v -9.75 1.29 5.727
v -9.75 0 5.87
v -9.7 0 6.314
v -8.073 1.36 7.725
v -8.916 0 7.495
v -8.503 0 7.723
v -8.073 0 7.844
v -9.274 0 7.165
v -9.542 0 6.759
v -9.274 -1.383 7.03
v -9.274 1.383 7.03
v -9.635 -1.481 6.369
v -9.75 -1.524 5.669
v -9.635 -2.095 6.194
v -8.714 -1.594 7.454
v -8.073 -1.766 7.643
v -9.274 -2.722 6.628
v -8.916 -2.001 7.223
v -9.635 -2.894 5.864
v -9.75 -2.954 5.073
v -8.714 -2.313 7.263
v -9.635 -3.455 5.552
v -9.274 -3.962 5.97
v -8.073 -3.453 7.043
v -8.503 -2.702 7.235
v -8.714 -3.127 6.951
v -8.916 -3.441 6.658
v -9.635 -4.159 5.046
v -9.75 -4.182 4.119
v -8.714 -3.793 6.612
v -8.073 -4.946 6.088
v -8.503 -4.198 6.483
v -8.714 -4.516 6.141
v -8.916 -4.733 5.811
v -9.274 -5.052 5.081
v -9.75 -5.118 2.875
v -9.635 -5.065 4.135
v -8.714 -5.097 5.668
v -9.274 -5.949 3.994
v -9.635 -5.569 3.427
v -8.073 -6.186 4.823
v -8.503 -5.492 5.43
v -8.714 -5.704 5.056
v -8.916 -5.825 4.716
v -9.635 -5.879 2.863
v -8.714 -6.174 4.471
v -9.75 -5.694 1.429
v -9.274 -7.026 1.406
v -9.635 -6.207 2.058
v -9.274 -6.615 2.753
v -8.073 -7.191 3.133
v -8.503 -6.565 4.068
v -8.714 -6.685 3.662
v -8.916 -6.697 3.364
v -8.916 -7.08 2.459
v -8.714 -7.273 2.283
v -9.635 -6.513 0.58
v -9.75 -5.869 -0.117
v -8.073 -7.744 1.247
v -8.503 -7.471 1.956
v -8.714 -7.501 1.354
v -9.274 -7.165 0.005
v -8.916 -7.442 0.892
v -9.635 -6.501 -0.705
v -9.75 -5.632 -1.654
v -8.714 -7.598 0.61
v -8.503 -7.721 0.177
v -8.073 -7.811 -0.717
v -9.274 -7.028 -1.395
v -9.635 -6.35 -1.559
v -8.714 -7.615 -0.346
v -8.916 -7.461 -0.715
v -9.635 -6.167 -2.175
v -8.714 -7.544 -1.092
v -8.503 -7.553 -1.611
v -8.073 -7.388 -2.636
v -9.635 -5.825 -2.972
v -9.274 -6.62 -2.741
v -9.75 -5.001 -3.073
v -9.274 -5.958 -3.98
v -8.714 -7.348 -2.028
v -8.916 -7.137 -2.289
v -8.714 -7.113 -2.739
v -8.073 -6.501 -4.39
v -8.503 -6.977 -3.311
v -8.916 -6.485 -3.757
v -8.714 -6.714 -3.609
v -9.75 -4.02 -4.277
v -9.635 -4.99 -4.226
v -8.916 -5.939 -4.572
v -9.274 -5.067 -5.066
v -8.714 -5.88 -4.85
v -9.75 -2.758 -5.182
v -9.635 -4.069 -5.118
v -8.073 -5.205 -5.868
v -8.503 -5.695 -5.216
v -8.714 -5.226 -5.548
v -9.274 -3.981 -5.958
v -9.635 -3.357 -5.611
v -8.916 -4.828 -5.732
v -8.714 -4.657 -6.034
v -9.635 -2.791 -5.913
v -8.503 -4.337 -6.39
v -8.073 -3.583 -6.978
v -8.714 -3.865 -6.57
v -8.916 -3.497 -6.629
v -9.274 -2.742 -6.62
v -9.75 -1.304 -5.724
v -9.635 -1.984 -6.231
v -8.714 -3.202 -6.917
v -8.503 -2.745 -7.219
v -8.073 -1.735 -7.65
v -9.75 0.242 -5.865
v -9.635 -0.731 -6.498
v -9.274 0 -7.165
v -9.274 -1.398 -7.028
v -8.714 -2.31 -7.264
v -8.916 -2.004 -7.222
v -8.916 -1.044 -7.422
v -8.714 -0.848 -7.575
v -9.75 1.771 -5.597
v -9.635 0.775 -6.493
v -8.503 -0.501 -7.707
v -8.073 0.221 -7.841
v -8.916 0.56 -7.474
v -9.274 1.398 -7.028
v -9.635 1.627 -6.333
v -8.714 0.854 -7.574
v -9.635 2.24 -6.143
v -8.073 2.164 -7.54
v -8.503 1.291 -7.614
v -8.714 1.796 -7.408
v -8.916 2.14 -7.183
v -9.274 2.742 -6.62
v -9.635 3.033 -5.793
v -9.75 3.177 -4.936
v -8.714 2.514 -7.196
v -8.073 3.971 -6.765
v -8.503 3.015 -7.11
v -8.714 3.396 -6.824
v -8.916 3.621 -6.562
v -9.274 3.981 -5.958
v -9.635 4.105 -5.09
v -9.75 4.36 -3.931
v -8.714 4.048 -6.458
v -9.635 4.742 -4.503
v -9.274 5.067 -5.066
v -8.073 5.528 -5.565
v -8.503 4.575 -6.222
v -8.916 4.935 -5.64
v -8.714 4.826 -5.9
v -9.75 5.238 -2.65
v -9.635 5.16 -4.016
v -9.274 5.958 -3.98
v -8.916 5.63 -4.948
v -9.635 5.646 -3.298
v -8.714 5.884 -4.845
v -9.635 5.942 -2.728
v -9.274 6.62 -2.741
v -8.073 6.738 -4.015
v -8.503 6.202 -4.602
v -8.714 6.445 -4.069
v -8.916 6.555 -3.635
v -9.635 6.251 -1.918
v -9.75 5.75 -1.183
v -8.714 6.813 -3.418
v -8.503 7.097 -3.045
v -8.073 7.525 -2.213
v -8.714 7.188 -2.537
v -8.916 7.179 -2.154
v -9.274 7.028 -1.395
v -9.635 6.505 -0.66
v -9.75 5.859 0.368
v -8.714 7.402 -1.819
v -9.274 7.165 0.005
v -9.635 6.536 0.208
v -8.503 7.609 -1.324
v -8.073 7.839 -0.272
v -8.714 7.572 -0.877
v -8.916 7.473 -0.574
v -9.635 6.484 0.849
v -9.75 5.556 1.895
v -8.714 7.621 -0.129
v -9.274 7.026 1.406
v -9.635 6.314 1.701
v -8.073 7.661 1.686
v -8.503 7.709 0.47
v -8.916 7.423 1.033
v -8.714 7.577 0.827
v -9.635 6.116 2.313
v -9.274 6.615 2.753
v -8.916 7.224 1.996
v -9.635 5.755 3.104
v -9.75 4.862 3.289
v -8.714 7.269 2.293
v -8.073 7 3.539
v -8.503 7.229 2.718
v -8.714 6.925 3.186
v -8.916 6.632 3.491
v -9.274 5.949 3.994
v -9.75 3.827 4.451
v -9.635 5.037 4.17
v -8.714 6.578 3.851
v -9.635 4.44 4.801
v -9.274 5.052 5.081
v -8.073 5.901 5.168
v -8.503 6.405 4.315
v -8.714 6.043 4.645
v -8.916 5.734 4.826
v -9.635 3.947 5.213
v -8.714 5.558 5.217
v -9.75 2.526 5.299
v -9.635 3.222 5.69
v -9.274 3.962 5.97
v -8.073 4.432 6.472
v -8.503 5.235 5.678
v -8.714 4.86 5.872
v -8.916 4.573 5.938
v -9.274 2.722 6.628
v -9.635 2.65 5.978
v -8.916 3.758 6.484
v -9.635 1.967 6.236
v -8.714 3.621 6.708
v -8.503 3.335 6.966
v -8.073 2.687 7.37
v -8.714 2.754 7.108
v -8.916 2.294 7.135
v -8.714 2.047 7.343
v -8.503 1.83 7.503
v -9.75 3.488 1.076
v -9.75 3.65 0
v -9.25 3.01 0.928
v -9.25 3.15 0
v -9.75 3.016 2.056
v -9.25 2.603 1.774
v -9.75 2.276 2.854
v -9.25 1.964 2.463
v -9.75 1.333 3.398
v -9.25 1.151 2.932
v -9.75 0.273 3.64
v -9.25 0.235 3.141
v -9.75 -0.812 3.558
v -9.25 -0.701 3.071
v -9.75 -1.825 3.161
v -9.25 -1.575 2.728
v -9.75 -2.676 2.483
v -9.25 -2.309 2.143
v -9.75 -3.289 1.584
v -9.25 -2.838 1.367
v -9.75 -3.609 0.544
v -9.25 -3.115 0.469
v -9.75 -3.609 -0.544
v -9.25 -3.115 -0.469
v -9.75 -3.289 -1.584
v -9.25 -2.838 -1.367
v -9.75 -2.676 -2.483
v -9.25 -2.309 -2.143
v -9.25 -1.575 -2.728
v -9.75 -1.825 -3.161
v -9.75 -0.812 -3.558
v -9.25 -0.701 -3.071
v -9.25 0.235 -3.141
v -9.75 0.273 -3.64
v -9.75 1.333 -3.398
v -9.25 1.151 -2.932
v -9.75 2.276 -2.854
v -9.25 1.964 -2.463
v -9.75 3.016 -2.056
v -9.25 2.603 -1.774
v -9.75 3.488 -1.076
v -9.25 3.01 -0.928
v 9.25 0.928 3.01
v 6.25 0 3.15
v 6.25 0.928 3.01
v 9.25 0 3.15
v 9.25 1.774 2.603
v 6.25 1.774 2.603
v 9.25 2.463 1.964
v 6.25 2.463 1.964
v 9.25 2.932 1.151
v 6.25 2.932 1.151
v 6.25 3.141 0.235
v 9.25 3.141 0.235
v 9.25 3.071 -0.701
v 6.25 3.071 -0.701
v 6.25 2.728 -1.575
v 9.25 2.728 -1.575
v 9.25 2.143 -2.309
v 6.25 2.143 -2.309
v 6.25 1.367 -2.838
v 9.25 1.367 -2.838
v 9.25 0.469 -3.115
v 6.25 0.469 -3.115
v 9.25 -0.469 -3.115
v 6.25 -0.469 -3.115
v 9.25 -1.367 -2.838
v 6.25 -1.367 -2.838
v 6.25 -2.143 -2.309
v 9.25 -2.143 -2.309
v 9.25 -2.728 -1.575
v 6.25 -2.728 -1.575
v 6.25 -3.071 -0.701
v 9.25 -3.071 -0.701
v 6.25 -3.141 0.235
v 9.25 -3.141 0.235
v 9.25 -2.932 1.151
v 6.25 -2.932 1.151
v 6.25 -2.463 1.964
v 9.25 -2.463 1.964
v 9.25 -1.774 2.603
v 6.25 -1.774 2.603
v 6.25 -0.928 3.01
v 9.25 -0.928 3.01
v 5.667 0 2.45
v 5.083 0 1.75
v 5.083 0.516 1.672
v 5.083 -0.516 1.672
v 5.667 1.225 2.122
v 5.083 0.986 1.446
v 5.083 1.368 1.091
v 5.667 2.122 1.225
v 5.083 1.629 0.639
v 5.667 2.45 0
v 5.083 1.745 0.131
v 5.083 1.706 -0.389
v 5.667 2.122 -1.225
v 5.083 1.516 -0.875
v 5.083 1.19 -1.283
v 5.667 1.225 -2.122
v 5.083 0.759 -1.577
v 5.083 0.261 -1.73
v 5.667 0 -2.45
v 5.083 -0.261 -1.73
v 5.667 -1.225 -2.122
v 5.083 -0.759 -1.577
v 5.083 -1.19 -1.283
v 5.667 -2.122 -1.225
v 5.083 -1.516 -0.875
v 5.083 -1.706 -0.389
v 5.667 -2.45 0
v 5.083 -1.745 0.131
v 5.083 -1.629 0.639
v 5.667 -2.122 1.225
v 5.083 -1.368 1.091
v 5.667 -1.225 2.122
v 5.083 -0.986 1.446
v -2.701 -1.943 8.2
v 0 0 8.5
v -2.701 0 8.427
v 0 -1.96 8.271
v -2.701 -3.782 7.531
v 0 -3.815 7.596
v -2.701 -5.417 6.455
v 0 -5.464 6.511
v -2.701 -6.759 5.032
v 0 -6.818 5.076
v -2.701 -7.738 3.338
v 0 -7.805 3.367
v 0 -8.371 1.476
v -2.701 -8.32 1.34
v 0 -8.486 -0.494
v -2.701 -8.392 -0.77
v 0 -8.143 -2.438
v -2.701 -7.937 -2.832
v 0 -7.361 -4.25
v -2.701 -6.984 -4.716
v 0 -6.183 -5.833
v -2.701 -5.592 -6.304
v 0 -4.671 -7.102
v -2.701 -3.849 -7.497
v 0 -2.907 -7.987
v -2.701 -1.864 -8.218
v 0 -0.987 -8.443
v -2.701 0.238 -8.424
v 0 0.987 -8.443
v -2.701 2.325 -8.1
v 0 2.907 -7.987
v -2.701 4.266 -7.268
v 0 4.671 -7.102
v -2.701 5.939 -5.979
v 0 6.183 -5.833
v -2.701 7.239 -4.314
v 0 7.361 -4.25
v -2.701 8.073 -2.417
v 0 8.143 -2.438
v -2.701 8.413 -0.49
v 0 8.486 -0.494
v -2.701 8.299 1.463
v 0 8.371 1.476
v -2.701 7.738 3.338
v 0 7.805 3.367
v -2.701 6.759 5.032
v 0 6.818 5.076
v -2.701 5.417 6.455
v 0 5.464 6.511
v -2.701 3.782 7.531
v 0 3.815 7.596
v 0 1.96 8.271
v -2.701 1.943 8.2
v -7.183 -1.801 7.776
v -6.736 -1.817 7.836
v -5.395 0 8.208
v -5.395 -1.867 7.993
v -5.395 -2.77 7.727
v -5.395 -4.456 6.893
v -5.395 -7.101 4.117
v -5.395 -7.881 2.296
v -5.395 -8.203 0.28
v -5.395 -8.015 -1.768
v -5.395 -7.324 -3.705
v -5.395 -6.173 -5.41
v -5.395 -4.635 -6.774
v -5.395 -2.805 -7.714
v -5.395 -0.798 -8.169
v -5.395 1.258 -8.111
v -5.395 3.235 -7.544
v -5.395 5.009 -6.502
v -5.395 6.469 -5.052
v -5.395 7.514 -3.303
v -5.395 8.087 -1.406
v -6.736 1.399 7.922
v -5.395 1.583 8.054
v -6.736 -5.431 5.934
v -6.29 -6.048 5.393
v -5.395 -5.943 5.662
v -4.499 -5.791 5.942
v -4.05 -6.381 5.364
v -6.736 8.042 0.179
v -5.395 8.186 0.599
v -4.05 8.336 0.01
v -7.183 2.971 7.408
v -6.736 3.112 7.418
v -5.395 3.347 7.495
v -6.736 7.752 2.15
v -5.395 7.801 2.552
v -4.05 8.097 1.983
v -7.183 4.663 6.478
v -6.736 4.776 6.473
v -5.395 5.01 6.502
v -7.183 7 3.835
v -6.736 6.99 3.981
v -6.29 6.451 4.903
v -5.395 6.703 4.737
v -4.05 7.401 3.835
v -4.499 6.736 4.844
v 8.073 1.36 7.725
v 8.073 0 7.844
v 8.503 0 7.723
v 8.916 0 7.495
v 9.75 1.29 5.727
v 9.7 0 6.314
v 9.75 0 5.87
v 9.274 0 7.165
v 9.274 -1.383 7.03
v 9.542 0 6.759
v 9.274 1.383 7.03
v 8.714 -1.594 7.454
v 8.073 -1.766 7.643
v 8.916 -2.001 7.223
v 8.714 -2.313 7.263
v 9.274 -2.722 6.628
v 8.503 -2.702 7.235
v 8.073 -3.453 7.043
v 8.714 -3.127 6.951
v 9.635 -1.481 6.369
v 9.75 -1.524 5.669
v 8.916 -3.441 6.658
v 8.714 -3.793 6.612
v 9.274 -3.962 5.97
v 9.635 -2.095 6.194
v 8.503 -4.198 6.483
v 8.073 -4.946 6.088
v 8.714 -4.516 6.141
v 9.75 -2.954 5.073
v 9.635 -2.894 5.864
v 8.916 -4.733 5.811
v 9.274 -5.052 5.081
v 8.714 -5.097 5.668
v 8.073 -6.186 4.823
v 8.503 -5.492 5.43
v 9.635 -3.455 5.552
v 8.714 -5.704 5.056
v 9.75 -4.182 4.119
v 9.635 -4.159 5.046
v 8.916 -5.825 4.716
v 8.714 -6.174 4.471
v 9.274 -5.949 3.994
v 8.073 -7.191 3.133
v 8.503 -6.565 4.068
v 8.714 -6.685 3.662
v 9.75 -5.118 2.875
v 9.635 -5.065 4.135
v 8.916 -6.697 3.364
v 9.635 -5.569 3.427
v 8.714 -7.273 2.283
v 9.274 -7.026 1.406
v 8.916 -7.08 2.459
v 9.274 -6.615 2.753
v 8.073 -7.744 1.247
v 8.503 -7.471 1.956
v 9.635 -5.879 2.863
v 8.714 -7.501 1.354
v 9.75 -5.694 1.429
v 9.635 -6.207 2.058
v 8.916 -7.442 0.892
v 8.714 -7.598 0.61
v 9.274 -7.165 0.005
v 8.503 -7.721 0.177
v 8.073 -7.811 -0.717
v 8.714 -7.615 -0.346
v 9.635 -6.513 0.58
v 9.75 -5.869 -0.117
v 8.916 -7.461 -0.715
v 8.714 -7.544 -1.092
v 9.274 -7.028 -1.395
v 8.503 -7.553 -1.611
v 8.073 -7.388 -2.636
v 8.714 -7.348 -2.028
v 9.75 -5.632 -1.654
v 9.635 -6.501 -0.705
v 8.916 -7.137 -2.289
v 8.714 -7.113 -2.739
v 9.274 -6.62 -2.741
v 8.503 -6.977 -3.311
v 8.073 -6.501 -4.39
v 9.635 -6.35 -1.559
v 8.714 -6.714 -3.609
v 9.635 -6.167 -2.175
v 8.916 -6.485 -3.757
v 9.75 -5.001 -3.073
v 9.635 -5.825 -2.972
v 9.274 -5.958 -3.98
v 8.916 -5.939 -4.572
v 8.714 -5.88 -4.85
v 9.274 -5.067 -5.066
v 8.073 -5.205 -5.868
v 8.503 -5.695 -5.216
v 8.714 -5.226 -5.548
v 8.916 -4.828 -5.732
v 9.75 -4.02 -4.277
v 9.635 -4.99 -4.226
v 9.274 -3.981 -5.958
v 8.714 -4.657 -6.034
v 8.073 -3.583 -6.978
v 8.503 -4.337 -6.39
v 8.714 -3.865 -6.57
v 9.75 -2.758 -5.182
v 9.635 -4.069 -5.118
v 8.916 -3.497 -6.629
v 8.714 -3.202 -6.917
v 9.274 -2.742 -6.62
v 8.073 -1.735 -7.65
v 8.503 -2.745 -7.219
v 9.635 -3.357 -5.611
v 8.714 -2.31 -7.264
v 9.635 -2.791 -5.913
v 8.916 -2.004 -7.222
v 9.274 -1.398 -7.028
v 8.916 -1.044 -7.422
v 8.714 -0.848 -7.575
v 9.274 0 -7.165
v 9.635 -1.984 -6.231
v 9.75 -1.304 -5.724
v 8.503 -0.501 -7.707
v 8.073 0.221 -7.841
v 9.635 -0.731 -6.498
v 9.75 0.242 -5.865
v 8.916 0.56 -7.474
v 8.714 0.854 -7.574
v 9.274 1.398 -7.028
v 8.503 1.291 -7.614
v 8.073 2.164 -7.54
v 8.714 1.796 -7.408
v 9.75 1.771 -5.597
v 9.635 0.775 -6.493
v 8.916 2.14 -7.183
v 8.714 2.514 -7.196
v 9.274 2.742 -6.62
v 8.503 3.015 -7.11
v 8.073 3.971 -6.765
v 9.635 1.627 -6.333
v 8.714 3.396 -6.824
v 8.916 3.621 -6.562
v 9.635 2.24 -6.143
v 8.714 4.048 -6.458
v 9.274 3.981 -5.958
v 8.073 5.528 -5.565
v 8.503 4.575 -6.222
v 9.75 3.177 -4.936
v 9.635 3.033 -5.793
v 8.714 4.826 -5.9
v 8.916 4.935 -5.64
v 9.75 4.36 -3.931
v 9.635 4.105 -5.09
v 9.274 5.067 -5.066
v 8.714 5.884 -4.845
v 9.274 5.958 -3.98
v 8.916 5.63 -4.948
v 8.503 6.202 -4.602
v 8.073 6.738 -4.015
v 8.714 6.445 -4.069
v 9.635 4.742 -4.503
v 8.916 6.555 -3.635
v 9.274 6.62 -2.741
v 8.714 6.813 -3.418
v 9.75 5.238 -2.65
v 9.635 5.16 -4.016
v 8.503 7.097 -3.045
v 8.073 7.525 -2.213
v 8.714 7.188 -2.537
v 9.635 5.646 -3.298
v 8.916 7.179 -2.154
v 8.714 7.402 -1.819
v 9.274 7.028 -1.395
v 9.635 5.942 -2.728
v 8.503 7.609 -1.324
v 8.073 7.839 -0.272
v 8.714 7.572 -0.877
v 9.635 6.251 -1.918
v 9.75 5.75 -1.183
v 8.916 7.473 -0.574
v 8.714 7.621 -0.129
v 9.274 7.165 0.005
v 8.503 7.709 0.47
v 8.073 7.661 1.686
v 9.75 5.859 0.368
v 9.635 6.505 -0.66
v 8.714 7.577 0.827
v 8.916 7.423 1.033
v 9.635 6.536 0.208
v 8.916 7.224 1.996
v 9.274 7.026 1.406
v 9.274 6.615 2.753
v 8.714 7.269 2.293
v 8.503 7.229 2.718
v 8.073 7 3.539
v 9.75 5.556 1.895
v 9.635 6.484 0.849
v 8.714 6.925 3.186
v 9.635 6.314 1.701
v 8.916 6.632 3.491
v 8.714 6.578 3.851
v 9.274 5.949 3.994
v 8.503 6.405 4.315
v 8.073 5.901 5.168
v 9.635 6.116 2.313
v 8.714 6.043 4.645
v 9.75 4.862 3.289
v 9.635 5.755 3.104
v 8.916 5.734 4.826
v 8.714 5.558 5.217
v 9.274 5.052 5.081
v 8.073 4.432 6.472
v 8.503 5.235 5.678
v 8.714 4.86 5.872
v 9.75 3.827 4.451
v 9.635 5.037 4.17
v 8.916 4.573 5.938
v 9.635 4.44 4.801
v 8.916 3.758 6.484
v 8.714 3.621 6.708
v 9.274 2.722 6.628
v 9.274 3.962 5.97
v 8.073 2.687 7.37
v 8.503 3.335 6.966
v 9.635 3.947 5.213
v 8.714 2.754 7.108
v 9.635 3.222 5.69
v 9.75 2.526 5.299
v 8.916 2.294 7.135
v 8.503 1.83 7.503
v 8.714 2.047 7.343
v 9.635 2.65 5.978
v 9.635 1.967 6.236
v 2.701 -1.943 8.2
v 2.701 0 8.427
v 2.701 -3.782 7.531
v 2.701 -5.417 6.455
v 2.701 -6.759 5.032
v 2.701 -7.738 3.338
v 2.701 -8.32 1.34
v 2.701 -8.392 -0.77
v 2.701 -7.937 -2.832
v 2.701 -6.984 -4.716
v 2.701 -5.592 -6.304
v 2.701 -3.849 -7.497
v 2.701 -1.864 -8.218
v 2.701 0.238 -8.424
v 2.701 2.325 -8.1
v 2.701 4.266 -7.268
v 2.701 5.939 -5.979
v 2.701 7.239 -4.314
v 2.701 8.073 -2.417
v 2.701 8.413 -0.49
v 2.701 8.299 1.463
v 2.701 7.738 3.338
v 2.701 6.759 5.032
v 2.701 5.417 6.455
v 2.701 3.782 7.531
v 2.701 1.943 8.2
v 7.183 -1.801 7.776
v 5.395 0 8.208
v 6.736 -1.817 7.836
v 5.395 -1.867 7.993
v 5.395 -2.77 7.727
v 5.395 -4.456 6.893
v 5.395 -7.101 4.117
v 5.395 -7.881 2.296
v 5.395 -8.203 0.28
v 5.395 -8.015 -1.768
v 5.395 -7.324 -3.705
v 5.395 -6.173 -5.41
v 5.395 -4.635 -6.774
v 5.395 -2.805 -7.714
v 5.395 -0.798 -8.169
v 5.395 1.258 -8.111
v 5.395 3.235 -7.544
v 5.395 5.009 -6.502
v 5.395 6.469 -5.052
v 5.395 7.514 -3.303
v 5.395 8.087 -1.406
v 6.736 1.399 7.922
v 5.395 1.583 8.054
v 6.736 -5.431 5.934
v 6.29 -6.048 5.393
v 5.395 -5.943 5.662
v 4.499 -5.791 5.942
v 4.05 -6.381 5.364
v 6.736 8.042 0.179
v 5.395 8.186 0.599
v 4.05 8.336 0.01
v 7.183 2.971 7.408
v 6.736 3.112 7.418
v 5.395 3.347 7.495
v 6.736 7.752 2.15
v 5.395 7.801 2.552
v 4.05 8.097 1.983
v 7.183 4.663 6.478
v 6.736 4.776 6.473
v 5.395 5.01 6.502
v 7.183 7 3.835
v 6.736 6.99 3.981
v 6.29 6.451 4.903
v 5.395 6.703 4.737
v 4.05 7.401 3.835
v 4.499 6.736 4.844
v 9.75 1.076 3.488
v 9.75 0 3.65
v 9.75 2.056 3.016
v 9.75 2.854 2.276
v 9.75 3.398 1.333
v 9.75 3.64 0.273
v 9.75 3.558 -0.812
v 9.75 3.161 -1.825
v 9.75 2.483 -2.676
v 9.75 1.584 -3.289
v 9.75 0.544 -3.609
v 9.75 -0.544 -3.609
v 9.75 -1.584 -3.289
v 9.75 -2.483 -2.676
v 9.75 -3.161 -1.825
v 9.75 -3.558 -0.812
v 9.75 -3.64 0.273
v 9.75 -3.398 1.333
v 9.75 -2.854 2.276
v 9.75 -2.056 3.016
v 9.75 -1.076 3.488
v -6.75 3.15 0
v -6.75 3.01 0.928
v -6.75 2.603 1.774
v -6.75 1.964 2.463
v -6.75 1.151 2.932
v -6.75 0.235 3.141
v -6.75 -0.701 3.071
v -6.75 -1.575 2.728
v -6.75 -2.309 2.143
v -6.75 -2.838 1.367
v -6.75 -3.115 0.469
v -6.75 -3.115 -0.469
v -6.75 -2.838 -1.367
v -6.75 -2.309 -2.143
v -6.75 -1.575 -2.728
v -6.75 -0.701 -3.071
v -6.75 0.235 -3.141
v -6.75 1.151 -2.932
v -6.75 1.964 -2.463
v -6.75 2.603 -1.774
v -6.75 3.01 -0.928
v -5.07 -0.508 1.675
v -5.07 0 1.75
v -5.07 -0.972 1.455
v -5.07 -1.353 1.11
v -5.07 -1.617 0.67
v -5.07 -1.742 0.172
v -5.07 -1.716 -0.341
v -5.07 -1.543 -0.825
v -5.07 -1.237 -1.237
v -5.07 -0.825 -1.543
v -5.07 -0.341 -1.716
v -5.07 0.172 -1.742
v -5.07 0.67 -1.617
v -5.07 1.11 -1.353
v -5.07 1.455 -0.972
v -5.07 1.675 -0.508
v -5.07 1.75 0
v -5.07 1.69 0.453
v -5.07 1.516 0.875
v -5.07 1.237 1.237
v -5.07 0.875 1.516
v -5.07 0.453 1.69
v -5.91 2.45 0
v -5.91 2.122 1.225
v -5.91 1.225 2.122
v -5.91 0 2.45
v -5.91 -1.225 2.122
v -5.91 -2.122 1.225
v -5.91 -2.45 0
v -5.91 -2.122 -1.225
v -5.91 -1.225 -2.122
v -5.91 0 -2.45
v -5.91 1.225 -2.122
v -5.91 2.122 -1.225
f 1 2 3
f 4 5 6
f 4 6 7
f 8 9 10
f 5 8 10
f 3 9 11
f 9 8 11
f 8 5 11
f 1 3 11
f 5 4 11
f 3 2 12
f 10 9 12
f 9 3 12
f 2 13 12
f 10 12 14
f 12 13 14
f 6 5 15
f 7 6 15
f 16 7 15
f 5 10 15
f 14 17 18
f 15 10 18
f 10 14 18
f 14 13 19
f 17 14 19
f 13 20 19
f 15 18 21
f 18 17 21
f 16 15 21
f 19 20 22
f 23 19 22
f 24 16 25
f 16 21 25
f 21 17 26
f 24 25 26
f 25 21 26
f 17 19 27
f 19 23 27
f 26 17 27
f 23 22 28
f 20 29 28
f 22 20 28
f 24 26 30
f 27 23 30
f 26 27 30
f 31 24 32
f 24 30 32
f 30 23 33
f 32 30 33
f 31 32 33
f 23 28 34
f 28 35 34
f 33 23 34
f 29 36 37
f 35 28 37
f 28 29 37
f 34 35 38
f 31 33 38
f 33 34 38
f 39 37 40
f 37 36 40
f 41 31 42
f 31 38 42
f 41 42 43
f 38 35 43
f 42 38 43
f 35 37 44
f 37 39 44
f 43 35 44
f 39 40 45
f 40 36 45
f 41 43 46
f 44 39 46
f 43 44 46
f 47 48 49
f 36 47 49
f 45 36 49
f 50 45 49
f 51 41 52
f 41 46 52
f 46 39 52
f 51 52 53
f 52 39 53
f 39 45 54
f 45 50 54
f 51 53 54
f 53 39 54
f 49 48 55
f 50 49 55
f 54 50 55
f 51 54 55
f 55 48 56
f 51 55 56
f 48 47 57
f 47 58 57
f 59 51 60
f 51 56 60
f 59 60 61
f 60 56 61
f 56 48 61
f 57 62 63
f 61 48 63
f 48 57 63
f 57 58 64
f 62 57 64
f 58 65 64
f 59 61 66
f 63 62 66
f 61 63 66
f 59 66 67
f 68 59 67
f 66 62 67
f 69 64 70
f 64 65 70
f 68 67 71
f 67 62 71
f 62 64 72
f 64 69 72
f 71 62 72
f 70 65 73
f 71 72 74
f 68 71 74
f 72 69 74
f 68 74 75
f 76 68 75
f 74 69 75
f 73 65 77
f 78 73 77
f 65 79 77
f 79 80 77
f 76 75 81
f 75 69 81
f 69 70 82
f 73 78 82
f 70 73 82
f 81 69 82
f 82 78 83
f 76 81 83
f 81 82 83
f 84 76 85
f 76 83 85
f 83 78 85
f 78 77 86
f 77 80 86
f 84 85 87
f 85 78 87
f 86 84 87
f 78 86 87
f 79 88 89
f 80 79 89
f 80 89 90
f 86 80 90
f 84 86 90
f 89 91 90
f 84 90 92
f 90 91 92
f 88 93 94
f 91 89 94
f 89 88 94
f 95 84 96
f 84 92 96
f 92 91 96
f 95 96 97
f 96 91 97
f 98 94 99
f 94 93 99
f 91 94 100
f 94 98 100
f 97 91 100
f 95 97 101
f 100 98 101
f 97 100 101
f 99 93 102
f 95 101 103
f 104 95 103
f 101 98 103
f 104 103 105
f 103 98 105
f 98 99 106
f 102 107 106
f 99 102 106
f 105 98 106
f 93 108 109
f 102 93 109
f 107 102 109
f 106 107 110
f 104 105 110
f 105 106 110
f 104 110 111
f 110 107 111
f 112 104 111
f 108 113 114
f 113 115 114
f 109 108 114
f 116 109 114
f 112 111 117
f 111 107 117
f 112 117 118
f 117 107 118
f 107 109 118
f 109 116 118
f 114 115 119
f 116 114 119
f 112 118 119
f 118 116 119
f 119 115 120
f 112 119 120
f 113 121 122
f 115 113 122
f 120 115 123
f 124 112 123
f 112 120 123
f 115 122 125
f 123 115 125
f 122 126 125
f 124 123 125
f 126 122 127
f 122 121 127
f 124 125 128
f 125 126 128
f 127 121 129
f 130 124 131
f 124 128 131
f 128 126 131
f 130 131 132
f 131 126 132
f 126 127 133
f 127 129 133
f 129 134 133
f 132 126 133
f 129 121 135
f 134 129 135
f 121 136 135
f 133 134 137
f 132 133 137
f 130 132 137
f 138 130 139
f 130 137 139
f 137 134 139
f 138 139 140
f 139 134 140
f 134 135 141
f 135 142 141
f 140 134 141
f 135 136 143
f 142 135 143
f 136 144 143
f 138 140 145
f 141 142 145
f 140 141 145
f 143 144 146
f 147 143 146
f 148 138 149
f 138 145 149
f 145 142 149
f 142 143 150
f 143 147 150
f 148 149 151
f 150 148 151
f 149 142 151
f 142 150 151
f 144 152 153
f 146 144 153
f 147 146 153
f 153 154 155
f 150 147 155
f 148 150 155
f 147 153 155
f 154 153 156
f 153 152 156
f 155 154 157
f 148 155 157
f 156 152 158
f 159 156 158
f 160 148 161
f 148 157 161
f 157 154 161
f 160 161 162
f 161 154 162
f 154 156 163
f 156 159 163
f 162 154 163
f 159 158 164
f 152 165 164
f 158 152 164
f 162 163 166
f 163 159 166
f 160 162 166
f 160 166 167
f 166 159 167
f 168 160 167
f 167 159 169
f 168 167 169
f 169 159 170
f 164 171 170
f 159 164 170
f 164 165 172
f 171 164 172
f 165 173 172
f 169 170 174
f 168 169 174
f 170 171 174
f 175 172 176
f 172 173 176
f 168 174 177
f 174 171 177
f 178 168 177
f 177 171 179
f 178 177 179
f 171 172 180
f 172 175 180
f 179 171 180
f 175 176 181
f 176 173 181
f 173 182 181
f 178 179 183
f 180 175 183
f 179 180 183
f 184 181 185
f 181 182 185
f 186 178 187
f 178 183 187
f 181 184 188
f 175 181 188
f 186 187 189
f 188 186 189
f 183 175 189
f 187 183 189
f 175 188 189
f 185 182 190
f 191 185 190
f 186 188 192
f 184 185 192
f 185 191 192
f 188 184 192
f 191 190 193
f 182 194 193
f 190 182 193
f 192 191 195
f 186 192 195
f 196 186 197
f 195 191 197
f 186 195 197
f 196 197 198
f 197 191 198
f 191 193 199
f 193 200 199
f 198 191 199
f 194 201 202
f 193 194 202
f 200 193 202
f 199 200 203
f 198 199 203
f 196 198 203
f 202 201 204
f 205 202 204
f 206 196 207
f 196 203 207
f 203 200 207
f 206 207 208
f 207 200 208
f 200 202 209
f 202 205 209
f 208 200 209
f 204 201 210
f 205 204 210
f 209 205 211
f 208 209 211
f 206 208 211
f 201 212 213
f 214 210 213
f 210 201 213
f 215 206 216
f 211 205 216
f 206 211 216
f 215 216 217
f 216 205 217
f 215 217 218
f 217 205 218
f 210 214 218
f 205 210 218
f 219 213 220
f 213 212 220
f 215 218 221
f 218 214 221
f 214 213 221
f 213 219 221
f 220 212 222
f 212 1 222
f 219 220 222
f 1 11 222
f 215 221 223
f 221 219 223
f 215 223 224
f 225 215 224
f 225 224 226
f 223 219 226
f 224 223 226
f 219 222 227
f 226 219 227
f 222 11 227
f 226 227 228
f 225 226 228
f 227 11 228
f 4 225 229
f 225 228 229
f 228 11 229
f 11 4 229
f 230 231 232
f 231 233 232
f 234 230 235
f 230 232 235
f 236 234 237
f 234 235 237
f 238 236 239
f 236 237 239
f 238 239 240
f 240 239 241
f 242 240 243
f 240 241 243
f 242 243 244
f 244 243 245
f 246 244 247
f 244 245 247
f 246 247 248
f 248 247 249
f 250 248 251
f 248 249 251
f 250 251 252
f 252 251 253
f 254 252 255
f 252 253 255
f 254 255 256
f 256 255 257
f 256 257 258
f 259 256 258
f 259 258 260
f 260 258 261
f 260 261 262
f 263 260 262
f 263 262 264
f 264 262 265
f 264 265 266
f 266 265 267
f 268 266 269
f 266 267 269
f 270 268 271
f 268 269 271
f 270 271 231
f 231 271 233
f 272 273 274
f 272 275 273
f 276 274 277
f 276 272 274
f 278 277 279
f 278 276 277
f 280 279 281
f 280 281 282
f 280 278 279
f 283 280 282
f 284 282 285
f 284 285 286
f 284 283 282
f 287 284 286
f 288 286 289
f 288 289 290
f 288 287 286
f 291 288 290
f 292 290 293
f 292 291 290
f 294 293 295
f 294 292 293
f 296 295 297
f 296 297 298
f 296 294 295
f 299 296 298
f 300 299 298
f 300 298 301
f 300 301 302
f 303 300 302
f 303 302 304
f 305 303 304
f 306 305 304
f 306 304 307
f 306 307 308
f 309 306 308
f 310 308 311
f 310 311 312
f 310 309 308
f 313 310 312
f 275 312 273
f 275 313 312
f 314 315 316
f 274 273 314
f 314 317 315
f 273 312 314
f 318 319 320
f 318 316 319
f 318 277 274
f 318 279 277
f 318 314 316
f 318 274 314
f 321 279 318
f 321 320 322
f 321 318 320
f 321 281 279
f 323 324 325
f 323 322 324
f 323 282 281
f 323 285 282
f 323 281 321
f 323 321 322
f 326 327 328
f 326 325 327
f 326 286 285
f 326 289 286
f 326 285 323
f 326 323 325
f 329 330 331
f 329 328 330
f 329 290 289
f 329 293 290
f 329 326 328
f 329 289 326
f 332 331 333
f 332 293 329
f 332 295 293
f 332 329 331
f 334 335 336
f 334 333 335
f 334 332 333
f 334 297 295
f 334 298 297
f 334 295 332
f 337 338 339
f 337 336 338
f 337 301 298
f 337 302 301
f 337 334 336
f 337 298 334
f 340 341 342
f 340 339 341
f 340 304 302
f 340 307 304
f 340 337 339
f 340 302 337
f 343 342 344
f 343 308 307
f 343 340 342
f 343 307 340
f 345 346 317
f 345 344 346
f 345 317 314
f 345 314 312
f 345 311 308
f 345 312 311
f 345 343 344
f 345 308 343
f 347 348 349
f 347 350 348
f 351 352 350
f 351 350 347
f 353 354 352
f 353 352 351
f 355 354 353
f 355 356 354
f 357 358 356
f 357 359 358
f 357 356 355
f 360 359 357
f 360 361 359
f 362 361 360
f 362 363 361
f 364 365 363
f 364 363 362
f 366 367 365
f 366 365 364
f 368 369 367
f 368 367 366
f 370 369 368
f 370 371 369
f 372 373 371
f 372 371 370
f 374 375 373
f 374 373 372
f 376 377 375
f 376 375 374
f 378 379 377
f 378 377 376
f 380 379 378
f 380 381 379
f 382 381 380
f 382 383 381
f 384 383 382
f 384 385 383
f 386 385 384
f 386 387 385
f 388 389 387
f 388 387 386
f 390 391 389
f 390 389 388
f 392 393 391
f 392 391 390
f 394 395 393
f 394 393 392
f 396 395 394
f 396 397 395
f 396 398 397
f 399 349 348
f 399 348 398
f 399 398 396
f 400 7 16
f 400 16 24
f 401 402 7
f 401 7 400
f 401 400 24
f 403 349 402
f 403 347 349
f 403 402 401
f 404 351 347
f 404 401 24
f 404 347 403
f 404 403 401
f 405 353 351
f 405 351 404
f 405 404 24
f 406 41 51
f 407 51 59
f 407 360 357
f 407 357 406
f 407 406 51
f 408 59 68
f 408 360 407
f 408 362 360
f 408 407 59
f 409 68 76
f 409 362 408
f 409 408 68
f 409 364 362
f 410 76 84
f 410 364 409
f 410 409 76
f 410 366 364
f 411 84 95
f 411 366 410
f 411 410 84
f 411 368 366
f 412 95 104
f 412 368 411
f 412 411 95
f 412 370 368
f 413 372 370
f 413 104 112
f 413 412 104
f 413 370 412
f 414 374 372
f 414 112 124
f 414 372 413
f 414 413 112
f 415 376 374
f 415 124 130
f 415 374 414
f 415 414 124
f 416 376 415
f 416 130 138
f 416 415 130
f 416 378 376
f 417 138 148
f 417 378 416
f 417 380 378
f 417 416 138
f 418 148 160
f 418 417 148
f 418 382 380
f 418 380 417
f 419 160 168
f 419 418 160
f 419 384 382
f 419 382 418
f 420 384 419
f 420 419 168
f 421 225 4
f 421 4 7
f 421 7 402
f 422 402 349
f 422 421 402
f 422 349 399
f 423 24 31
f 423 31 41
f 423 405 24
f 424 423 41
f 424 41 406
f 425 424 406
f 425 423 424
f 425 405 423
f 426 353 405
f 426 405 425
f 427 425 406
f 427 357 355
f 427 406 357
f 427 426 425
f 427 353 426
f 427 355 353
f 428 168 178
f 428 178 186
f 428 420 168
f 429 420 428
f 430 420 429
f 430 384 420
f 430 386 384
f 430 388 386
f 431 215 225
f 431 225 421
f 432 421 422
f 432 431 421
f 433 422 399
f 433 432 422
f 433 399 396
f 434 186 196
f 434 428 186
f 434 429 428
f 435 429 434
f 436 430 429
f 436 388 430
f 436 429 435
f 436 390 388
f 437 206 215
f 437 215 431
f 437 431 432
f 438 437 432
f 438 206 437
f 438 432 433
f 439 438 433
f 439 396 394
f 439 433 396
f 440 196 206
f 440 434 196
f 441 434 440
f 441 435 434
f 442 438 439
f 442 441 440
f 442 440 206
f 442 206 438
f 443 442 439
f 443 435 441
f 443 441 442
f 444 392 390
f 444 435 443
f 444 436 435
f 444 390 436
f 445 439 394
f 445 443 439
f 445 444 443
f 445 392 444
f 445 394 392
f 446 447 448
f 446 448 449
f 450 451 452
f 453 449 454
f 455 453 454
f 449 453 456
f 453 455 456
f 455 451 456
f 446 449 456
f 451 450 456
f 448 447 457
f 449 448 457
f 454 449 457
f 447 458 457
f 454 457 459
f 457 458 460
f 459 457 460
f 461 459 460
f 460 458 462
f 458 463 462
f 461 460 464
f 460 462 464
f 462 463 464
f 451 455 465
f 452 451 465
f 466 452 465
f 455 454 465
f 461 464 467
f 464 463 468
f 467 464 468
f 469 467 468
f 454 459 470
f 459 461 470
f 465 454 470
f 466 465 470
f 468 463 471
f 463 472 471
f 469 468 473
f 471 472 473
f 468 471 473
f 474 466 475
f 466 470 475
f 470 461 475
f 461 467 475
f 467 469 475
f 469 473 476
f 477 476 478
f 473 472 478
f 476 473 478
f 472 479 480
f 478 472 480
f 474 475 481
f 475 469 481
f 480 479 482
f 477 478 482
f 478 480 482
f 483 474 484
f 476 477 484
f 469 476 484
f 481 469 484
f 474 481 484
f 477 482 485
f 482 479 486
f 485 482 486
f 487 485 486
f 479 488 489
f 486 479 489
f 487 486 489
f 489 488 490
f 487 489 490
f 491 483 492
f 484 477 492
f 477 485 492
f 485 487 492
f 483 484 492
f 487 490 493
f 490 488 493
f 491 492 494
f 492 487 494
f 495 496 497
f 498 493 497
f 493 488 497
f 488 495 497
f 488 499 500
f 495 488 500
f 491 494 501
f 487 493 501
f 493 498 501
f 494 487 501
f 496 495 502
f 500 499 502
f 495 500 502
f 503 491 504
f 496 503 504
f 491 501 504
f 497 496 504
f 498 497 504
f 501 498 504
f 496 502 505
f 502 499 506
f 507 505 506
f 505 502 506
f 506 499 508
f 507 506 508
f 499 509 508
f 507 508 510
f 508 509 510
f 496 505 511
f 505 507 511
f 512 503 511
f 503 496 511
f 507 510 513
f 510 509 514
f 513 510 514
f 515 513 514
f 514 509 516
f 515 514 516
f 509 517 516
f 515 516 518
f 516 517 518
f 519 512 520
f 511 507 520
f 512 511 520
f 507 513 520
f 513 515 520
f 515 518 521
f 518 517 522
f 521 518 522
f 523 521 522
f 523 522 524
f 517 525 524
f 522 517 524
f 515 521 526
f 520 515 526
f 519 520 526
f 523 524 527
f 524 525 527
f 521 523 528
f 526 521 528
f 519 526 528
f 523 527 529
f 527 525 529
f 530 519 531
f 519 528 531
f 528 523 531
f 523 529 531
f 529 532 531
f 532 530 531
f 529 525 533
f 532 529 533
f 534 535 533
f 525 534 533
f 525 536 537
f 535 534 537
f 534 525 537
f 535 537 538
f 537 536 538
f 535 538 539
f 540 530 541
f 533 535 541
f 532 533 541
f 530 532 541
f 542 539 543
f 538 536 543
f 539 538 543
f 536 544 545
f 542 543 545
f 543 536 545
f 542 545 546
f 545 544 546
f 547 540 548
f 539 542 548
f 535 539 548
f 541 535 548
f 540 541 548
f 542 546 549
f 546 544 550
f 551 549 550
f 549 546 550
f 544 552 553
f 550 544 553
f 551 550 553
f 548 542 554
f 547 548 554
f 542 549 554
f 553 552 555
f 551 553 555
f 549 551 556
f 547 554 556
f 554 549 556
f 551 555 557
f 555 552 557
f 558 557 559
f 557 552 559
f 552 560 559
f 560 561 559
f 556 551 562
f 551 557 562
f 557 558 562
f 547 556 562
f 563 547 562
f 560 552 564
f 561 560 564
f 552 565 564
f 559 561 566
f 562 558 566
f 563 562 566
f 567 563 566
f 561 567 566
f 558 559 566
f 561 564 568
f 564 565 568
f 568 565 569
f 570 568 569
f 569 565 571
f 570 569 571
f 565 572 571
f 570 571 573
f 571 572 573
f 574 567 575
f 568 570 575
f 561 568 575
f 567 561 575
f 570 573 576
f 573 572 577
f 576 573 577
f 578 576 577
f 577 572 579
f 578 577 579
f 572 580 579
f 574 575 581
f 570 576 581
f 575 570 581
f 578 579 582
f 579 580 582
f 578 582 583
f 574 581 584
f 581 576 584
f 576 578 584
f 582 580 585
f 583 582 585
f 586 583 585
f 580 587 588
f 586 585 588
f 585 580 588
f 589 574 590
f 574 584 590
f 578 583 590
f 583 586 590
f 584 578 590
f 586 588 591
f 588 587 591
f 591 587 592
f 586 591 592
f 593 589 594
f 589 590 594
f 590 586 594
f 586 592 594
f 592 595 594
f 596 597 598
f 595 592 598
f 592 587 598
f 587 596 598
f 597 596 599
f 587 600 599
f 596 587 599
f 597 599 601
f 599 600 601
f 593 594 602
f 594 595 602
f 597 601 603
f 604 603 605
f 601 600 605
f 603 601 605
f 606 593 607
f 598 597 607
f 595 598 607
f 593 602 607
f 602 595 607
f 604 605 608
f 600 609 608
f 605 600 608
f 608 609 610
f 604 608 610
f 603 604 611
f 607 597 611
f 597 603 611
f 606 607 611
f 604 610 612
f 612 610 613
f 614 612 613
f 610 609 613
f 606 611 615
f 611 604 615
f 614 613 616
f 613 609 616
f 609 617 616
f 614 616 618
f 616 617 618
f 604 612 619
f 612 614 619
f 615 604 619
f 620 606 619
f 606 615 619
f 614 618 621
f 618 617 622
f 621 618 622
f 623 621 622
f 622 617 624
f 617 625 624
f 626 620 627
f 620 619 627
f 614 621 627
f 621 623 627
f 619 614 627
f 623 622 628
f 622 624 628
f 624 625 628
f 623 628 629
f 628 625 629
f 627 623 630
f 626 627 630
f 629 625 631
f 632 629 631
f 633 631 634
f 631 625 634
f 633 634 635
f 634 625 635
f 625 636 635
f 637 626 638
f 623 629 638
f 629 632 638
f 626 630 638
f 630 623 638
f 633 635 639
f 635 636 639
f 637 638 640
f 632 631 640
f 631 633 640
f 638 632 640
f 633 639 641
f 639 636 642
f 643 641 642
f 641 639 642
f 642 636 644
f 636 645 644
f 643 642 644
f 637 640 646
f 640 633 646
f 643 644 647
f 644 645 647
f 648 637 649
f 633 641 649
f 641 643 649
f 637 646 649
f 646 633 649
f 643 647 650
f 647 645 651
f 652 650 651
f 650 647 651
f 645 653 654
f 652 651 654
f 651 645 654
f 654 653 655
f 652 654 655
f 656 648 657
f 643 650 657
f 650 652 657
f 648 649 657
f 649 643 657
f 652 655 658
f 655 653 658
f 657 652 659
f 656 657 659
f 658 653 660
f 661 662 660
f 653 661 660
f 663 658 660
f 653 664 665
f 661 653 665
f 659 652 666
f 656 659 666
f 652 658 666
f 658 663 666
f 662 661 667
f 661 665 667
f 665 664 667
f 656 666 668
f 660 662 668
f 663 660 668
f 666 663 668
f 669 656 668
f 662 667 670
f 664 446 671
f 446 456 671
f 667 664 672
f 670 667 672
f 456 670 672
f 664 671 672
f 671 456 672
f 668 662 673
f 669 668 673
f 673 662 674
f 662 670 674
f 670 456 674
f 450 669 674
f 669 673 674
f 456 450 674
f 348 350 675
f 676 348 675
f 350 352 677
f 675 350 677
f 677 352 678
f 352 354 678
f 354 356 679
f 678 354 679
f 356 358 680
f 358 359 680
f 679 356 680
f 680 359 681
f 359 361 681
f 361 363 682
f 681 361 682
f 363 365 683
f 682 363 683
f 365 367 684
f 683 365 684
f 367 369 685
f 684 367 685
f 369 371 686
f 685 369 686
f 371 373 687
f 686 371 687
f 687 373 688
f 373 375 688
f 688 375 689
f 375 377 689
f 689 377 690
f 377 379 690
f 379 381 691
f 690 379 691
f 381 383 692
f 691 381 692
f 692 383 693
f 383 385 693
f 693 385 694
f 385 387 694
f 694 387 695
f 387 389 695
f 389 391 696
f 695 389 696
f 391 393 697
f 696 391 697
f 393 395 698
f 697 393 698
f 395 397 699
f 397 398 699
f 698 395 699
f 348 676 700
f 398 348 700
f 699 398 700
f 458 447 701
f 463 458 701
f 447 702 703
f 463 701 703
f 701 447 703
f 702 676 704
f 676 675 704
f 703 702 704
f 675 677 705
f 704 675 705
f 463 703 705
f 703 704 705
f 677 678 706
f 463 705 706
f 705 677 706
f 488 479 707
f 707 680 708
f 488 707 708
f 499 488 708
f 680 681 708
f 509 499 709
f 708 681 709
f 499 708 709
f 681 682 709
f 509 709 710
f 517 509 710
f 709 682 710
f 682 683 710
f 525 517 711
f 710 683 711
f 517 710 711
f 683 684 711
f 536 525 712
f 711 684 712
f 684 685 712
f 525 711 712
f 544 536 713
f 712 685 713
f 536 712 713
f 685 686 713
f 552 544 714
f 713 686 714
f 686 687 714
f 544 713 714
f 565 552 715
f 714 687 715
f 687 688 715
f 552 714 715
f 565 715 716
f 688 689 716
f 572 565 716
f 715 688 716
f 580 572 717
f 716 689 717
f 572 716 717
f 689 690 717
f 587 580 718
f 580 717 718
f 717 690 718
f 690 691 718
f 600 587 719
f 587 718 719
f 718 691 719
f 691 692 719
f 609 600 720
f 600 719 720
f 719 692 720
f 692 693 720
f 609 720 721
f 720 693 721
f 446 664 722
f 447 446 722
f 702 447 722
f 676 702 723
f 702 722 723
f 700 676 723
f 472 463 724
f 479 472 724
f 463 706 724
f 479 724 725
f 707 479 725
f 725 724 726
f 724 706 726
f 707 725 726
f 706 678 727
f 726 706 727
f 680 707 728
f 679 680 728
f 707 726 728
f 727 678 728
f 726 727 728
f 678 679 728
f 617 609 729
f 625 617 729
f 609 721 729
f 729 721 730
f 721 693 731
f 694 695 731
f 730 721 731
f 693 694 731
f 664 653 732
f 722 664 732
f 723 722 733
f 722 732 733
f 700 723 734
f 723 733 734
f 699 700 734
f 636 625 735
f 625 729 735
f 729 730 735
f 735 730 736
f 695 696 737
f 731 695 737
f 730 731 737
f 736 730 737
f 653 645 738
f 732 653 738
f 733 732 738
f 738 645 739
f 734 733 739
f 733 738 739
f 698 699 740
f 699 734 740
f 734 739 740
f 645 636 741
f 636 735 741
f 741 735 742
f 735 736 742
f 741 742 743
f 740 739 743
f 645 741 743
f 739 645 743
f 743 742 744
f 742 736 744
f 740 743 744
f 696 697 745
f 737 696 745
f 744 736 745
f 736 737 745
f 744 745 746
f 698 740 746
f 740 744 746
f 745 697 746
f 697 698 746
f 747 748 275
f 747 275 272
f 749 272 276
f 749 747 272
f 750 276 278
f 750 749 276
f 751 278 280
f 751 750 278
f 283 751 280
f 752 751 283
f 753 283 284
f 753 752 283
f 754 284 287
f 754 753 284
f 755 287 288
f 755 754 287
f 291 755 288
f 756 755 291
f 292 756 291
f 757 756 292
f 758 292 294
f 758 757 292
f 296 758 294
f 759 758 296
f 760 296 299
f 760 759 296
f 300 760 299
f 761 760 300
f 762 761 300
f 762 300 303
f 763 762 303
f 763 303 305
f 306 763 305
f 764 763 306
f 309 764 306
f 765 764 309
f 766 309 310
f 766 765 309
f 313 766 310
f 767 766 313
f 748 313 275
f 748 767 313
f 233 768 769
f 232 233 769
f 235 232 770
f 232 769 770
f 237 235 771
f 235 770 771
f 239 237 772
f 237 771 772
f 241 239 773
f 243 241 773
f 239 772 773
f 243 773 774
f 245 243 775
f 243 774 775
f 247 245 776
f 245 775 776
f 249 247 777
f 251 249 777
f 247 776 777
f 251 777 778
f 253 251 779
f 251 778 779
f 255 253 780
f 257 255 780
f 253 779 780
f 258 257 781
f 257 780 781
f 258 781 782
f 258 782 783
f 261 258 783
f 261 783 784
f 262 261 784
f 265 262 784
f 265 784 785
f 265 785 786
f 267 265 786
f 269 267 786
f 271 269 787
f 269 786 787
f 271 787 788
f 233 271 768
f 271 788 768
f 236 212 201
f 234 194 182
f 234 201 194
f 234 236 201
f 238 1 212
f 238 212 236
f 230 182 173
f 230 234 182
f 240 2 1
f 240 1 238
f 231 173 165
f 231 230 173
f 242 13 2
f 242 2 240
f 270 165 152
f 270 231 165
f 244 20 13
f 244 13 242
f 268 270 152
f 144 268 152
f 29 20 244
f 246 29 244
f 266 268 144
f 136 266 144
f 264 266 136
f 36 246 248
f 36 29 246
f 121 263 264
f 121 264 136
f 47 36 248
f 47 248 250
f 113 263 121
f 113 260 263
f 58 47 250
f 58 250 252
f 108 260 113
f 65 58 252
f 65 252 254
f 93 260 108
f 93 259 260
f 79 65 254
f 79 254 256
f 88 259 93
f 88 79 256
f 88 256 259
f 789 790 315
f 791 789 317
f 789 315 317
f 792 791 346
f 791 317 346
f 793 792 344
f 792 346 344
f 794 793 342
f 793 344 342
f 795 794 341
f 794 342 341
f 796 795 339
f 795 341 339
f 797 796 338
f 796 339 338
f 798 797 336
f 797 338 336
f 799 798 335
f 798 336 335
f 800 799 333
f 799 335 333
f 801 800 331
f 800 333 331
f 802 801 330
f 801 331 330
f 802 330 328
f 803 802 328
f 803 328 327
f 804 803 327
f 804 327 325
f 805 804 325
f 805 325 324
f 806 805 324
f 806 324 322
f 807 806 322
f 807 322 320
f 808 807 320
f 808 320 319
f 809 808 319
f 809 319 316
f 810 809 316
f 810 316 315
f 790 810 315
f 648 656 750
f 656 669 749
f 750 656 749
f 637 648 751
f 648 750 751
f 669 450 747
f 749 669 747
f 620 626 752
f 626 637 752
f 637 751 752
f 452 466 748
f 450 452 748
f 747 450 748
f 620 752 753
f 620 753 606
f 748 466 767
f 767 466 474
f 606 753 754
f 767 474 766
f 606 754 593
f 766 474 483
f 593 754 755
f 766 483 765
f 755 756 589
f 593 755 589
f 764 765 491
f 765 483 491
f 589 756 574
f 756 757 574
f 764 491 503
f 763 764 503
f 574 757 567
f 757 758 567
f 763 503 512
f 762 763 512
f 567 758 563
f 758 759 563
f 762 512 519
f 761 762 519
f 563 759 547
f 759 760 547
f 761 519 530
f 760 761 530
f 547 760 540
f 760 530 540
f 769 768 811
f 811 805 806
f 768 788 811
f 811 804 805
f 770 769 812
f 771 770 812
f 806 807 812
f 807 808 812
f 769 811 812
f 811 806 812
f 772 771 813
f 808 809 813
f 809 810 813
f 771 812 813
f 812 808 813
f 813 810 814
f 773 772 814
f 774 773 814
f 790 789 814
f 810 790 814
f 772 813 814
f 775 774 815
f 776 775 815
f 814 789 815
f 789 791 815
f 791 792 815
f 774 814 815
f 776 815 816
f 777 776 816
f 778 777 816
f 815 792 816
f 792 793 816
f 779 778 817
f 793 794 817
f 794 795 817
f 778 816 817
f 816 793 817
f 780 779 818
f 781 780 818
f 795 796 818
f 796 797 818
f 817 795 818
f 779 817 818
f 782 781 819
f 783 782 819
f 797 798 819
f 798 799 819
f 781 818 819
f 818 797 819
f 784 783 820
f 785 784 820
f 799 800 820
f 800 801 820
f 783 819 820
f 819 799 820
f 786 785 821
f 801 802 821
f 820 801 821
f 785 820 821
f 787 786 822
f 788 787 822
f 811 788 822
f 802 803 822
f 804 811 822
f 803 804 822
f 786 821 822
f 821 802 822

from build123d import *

# Parameters (mm, degrees)
SKETCH3_W            = 6
SKETCH3_H            = 3.15
FILLET1_R            = 2
FILLET1_OF_MIRROR1_R = 2
CHAMFER2_SIZE        = 0.5
CHAMFER3_SIZE        = 3
CHAMFER3_SIZE_2      = 2.5


# Read off the part's stored shape, not the designer's step: Mirror5
with BuildPart() as part:
    # Sketch1 → Revolve2 (revolve)
    with BuildSketch(Plane.XY, mode=Mode.PRIVATE) as revolve2_sk:
        with BuildLine():
            Line((0, 1.75), (9.75, 1.75))
            Line((9.75, 1.75), (9.75, 7.540162112))
            ThreePointArc((9.75, 7.540162112), (4.89856583, 8.259461943), (0, 8.5))
            Line((0, 8.5), (0, 1.75))
        make_face()
    revolve2 = revolve(revolve2_sk.sketch.rotate(Axis((0, 0, 0), (1, 0, 0)), 90), axis=Axis((0, 0, 0), (1, 0, 0)))

    # Sketch3 → Cut-Revolve1 (revolve, cut)
    with BuildSketch(Plane.XY, mode=Mode.PRIVATE) as cut_revolve1_sk:
        with Locations((6.75, 1.575)):
            Rectangle(SKETCH3_W, SKETCH3_H)
    revolve(cut_revolve1_sk.sketch.rotate(Axis((3.75, 0, 0), (-1, 0, 0)), 270), axis=Axis((3.75, 0, 0), (-1, 0, 0)), mode=Mode.SUBTRACT)

    # Fillet1
    fillet1_edges = [part.edges().sort_by_distance(p)[0] for p in [
        (9.75, 0, -7.540162112),
    ]]
    fillet(fillet1_edges, radius=FILLET1_R)

    # Mirror1: Revolve2 across plane
    add(revolve2.mirror(Plane(origin=(0, 0, 0), x_dir=(0, 0, 1), z_dir=(1, 0, 0))))

    # Fillet1 of Mirror1
    fillet1_of_mirror1_edges = [part.edges().sort_by_distance(p)[0] for p in [
        (-9.75, 0, -7.540162112),
    ]]
    fillet(fillet1_of_mirror1_edges, radius=FILLET1_OF_MIRROR1_R)

    # Chamfer2
    chamfer2_edges = [part.edges().sort_by_distance(p)[0] for p in [
        (9.75, 0, -3.15),
    ]]
    chamfer(chamfer2_edges, length=CHAMFER2_SIZE)

    # Mirror5 outline → Mirror5 (revolve, cut)
    with BuildSketch(Plane.YX):
        Polygon((3.15, -9.25), (3.15, -3.75), (1.75, -3.75), (1.75, -9.75), (3.65, -9.75), align=None)
    revolve(axis=Axis((0, 0, 0), (1, 0, 0)), mode=Mode.SUBTRACT)

    # Chamfer3
    # the kernel refuses this chamfer: 3, 2.5 mm, written as the material it adds along each edge
    with BuildSketch(Plane(origin=(-3.75, 0, 0), x_dir=(0, 1, 0), z_dir=(0, 0, -1))) as chamfer3_piece_1_section:
        Polygon((3.15, -CHAMFER3_SIZE), (3.15 - CHAMFER3_SIZE_2, 0), (3.15, 0), align=None)
    chamfer3_piece_1 = revolve(axis=Axis((-3.75, 0, 0), (1, 0, 0)), mode=Mode.PRIVATE)
    chamfer3_piece_1 = chamfer3_piece_1 - Plane(origin=(-5.931911747, 0, 0), x_dir=(0, 0, 1), z_dir=(1, 0, 0)) * Cylinder(1.75, 13, mode=Mode.PRIVATE)
    add(chamfer3_piece_1)
    with BuildSketch(Plane(origin=(3.75, 0, 0), x_dir=(0, 0, 1), z_dir=(0, -1, 0))) as chamfer3_piece_2_section:
        Polygon((3.15 - CHAMFER3_SIZE, 0), (3.15, -CHAMFER3_SIZE_2), (3.15, 0), align=None)
    chamfer3_piece_2 = revolve(axis=Axis((3.75, 0, 0), (-1, 0, 0)), mode=Mode.PRIVATE)
    chamfer3_piece_2 = chamfer3_piece_2 - Plane(origin=(5.677253333, 0, 0), x_dir=(0, 0, 1), z_dir=(1, 0, 0)) * Cylinder(1.75, 13, mode=Mode.PRIVATE)
    add(chamfer3_piece_2)


solid = part.part
